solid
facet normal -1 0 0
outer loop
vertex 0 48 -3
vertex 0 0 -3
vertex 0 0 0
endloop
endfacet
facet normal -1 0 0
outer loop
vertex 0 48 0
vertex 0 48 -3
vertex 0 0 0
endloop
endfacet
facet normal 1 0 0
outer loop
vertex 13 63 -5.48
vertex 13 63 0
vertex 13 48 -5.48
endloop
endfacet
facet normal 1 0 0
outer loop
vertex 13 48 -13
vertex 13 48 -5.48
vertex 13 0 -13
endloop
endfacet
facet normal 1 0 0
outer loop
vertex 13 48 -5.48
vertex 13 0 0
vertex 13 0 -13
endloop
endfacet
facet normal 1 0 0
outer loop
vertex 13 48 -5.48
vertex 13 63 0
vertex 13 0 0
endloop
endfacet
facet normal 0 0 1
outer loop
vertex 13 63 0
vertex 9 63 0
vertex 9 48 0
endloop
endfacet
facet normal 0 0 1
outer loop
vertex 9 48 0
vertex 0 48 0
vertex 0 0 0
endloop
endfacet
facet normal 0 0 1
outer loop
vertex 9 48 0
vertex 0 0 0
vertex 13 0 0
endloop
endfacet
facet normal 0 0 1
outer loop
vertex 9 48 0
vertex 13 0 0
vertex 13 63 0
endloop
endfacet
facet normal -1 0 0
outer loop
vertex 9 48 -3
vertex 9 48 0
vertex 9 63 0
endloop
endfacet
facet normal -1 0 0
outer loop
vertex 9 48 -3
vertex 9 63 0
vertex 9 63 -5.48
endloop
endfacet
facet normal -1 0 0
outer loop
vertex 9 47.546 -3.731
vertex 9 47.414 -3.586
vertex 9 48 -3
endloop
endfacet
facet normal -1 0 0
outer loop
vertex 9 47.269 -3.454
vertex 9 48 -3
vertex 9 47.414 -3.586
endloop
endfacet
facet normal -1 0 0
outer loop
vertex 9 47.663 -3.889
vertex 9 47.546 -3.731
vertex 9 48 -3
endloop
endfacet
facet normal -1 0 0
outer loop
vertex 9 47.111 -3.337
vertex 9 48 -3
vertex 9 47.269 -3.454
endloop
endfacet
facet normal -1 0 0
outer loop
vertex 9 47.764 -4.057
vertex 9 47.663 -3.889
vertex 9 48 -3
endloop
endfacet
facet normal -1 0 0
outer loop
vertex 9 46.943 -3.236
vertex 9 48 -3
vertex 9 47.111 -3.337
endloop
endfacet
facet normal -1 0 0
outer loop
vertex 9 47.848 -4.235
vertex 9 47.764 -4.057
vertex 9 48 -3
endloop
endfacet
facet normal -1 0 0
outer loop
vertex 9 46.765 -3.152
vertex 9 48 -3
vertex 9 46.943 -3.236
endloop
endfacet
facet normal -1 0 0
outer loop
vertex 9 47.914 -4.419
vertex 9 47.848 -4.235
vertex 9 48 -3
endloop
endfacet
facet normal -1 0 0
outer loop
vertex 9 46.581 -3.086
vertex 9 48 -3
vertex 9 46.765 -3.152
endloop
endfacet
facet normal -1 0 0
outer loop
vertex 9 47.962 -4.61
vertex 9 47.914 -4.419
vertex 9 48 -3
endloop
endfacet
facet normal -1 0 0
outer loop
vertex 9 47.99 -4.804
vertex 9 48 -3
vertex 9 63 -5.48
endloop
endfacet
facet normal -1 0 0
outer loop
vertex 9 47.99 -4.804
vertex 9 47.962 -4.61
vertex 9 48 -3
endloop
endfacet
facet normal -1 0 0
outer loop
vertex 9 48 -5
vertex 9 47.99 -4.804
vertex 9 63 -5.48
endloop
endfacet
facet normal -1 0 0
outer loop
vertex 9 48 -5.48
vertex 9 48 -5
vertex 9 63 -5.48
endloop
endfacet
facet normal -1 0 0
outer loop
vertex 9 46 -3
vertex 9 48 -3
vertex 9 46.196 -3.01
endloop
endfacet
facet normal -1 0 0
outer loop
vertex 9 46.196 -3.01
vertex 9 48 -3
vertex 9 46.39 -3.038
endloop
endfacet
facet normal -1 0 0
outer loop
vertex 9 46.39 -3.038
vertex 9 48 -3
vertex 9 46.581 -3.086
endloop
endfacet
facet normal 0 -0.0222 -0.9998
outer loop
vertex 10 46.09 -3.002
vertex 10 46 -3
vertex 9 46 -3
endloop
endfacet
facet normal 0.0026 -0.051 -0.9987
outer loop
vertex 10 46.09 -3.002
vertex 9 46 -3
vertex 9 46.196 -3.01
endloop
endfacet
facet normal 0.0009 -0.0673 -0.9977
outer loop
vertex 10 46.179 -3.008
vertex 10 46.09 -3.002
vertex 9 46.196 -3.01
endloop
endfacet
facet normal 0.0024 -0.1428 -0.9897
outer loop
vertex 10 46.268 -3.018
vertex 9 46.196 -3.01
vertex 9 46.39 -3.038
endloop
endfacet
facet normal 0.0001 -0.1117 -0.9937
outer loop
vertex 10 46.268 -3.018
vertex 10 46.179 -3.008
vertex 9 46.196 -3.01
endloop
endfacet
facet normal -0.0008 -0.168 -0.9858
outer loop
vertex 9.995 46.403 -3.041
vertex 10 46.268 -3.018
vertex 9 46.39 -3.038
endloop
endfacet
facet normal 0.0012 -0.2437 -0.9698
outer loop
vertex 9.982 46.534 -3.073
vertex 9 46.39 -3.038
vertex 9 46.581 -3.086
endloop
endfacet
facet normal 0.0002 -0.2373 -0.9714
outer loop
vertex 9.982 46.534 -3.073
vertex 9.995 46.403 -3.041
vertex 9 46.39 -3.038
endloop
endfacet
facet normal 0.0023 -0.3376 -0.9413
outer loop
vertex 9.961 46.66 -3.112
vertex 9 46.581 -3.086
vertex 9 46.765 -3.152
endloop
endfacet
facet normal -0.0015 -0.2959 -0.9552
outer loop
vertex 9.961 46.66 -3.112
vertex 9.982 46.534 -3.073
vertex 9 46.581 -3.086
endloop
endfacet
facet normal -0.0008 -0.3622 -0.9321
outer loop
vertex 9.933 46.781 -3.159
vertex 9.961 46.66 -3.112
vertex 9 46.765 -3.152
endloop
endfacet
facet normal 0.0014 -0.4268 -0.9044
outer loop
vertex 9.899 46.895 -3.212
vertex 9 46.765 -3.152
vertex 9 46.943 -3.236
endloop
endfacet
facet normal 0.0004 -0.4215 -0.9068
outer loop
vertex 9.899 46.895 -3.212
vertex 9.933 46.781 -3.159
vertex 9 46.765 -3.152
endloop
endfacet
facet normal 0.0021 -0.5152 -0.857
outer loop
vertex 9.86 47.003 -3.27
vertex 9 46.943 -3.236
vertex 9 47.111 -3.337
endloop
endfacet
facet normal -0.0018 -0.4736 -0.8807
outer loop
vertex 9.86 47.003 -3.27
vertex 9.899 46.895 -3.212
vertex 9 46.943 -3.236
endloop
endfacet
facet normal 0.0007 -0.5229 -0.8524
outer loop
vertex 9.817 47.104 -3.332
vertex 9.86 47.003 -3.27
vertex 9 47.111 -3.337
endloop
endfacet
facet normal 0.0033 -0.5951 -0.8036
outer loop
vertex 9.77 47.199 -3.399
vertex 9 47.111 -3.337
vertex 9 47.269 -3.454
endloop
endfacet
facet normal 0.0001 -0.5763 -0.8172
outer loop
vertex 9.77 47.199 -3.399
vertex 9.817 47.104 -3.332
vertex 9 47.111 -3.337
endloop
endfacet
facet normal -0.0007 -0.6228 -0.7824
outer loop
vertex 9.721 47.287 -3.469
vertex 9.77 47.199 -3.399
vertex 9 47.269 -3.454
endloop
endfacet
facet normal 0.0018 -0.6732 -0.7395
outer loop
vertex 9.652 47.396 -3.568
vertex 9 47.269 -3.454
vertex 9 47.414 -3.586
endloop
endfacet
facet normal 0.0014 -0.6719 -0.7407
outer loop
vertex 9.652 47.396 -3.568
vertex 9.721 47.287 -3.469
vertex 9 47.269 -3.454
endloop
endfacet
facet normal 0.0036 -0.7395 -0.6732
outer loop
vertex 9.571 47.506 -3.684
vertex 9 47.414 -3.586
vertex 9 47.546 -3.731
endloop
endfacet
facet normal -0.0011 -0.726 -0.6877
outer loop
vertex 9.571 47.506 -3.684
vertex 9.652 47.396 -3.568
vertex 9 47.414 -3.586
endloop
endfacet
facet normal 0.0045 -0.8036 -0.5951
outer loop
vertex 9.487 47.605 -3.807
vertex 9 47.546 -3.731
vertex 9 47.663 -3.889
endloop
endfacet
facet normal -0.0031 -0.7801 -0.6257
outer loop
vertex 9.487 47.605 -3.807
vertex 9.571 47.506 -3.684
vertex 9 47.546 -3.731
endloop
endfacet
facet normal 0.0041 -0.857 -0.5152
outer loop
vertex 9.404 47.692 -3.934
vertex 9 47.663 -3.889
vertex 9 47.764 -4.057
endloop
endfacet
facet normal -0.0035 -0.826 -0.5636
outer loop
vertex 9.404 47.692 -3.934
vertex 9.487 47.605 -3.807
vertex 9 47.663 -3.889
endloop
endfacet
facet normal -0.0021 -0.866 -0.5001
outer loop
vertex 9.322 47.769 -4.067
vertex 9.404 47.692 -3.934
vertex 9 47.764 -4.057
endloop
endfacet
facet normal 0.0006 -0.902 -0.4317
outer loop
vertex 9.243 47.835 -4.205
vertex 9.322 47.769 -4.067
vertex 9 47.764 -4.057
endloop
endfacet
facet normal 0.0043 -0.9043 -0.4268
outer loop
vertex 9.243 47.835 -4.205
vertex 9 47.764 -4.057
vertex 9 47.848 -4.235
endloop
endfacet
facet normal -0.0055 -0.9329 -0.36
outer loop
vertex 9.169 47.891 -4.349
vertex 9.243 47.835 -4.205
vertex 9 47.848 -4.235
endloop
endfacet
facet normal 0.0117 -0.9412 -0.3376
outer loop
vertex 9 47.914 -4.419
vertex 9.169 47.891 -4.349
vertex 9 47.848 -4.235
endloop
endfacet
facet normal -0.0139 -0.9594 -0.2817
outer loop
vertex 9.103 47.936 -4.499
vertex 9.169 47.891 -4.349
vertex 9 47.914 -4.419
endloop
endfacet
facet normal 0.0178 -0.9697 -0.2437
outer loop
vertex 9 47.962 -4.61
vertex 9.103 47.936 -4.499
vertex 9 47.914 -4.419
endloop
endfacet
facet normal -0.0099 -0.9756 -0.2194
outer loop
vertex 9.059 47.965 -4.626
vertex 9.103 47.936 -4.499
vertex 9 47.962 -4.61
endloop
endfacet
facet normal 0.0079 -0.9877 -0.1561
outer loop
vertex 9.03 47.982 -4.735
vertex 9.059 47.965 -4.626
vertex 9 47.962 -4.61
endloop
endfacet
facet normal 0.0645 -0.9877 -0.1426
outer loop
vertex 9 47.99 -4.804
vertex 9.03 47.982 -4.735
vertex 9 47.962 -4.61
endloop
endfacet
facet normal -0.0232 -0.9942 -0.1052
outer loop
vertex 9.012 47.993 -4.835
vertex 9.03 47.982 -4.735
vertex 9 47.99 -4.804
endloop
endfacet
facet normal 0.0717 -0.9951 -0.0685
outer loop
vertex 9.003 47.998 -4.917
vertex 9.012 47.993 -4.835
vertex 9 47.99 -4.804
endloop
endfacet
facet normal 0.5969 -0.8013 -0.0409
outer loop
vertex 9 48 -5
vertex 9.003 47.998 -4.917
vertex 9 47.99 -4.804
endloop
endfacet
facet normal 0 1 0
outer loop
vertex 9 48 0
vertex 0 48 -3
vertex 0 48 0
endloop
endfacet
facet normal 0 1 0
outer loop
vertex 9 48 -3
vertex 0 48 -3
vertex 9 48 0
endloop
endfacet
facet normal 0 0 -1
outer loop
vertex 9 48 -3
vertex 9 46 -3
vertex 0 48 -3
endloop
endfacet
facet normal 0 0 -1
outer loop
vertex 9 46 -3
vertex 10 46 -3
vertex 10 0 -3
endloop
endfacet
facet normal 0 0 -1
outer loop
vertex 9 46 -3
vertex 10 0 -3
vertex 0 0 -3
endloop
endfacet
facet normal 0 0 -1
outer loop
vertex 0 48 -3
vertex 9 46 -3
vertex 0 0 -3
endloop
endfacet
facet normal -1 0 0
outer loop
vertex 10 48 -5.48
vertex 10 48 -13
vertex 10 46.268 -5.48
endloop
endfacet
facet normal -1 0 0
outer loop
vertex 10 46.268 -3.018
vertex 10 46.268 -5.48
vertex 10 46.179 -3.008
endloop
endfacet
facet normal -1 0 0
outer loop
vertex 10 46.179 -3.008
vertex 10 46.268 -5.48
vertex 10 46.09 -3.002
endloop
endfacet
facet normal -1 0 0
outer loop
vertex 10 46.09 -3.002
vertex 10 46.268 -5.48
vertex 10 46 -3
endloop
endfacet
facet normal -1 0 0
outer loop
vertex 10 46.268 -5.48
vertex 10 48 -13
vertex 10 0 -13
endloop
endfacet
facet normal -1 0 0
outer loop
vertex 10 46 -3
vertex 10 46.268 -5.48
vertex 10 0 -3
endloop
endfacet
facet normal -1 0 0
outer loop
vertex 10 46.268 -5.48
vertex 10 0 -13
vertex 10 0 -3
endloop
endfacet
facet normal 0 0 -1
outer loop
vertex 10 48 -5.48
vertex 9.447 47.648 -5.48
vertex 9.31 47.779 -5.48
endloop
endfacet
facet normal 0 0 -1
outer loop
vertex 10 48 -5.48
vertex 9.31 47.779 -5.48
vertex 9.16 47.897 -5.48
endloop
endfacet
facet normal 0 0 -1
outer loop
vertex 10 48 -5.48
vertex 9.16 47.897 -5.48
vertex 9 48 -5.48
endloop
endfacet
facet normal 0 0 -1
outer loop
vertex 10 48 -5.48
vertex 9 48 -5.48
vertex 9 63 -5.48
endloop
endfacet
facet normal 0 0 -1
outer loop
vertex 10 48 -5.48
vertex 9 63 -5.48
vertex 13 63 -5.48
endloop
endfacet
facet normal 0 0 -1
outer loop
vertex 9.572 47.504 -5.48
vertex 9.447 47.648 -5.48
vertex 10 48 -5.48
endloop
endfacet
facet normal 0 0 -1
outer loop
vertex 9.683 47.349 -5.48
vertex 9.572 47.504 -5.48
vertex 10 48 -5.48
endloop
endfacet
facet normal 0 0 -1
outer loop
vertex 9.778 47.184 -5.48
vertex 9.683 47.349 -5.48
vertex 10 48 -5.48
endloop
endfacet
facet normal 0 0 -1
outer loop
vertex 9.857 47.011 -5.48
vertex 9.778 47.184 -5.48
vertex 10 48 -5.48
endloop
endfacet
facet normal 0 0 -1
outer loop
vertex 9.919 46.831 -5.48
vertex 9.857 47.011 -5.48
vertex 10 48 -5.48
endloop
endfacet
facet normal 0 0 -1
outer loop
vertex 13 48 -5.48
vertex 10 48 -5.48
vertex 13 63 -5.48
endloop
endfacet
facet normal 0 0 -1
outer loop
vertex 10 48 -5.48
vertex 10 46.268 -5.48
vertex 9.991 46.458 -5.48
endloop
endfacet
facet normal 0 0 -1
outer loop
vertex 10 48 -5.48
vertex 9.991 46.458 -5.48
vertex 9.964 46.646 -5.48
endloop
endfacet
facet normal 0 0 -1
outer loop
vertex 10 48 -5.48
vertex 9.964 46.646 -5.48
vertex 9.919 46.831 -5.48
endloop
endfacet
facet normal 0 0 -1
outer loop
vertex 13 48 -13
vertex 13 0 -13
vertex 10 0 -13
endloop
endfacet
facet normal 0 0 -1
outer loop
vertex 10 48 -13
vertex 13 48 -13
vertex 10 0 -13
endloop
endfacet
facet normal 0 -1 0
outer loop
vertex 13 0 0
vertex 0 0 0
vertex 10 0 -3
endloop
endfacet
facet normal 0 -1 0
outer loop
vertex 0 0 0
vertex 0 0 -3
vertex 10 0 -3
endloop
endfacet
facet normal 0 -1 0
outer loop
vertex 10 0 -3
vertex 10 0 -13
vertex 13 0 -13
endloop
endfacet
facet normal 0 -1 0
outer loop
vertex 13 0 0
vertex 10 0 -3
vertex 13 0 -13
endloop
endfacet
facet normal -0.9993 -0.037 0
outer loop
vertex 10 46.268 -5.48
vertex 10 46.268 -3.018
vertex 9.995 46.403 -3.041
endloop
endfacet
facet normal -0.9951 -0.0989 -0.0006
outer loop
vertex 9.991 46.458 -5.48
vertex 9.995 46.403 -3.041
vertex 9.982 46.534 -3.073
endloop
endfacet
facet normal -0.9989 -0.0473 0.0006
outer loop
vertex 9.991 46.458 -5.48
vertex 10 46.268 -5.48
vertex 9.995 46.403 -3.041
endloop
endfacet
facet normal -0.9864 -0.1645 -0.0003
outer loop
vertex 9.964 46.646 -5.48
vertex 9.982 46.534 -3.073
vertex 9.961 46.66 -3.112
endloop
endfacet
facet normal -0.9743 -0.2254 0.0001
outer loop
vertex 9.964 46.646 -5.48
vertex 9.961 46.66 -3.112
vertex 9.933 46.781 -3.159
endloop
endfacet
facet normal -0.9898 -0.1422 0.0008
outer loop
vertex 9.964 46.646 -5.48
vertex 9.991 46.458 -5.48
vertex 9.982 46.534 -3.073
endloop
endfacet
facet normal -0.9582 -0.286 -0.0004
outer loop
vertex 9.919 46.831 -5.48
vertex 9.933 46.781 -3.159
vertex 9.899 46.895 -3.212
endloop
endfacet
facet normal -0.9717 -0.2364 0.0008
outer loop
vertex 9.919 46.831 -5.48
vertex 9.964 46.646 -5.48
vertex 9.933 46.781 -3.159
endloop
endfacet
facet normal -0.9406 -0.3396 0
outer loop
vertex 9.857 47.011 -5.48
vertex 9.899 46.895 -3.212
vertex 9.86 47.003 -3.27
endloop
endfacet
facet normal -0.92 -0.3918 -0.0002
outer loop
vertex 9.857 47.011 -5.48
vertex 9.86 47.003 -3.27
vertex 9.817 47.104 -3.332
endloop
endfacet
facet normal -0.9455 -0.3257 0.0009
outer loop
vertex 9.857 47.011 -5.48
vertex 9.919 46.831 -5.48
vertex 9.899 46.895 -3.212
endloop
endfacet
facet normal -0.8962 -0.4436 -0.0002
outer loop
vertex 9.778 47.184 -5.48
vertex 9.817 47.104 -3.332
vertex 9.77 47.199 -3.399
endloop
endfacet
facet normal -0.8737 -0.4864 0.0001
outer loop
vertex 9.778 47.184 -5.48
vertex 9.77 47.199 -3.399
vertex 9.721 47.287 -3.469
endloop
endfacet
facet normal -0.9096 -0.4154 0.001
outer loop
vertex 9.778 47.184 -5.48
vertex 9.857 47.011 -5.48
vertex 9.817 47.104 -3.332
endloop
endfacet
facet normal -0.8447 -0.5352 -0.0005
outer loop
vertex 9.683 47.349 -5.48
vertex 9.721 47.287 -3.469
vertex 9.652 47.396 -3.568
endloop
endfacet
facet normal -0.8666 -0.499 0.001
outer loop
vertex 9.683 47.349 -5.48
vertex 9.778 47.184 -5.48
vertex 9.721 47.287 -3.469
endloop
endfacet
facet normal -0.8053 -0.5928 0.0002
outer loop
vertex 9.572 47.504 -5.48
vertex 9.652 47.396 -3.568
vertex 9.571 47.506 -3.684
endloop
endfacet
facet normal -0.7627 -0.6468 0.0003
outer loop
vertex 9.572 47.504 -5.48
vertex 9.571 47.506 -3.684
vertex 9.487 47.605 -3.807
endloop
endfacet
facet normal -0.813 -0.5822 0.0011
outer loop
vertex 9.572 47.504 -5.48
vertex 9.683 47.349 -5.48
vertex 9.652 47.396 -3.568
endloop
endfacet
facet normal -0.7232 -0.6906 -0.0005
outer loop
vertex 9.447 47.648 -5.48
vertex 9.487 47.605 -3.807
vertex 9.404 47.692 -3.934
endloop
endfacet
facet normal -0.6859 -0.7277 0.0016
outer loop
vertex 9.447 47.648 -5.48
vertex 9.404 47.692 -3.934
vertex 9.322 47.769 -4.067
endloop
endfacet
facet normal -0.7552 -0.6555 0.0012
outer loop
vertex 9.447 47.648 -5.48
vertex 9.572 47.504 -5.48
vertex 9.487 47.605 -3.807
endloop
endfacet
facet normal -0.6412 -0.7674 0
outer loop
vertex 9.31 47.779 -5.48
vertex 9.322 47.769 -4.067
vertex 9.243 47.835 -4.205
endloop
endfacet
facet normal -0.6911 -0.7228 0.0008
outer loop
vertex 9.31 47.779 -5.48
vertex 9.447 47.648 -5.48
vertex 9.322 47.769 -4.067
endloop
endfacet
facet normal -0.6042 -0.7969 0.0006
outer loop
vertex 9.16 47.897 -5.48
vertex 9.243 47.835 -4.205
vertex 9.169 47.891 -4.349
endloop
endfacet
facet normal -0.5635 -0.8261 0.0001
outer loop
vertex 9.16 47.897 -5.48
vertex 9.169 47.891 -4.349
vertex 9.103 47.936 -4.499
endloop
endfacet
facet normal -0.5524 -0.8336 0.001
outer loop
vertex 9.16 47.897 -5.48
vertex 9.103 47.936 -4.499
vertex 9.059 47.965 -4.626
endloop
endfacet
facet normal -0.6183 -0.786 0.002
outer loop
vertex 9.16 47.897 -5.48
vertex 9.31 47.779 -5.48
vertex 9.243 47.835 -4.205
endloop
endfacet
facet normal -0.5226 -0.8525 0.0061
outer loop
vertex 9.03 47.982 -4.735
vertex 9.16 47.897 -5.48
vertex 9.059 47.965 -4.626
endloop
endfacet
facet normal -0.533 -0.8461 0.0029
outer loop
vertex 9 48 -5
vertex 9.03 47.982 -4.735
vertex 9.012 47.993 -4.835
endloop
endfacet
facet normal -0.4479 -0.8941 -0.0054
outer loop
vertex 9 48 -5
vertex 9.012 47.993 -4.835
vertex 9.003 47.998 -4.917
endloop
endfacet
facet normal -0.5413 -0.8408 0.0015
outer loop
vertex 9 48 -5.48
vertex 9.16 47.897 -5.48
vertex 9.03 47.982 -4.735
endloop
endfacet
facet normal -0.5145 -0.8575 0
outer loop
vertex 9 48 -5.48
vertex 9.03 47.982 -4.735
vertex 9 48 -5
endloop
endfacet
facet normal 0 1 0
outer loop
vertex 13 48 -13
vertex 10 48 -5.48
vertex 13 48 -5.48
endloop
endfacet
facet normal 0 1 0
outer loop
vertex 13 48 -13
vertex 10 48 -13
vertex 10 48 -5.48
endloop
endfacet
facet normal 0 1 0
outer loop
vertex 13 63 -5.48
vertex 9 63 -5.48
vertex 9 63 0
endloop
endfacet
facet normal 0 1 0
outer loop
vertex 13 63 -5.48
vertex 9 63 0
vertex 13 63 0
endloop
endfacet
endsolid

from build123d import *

# Parameters (mm, degrees)
SALIENTE_EXTRUIR1_DEPTH = 48
CROQUIS3_W              = 4
CROQUIS3_H              = 5.48
SALIENTE_EXTRUIR3_DEPTH = 15
REDONDEO1_R             = 2


with BuildPart() as part:
    # Croquis1 → Saliente-Extruir1 (new body)
    with BuildSketch(Plane(origin=(0, 0, 0), x_dir=(1, 0, 0), z_dir=(0, 1, 0))):
        Polygon((0, 0), (13, 0), (13, 13), (10, 13), (10, 3), (0, 3), align=None)
    extrude(amount=SALIENTE_EXTRUIR1_DEPTH)

    # Croquis3 → Saliente-Extruir3 (add)
    with BuildSketch(Plane(origin=(0, 48, 0), x_dir=(1, 0, 0), z_dir=(0, 1, 0))):
        with Locations((11, 2.74)):
            Rectangle(CROQUIS3_W, CROQUIS3_H)
    extrude(amount=SALIENTE_EXTRUIR3_DEPTH)

    # Redondeo1
    # the kernel refuses this fillet: 2 mm, written as the material it adds along each edge
    with BuildSketch(Plane(origin=(15, 48, -3), x_dir=(0, -1, 0), z_dir=(-1, 0, 0))) as redondeo1_piece_1_section:
        with BuildLine():
            CenterArc((REDONDEO1_R, -REDONDEO1_R), REDONDEO1_R, 90, 90)
            Line((0, -REDONDEO1_R), (0, 0))
            Line((0, 0), (REDONDEO1_R, 0))
        make_face()
    redondeo1_piece_1 = extrude(amount=6, mode=Mode.PRIVATE)
    redondeo1_piece_1 = split(redondeo1_piece_1, bisect_by=Plane(origin=(13, 47.553264122, -3.446735878), z_dir=(-1, 0, 0)), keep=Keep.TOP, mode=Mode.PRIVATE)
    add(redondeo1_piece_1)
    with BuildSketch(Plane(origin=(10, 48, -5.48), x_dir=(-1, 0, 0), z_dir=(0, 0, 1))) as redondeo1_piece_2:
        with BuildLine():
            CenterArc((2, 1.732050808), REDONDEO1_R, 180, 60)
            Line((0, 1.732050808), (0, 0))
            Line((0, 0), (1, 0))
        make_face()
    extrude(amount=2.48)


solid = part.part
